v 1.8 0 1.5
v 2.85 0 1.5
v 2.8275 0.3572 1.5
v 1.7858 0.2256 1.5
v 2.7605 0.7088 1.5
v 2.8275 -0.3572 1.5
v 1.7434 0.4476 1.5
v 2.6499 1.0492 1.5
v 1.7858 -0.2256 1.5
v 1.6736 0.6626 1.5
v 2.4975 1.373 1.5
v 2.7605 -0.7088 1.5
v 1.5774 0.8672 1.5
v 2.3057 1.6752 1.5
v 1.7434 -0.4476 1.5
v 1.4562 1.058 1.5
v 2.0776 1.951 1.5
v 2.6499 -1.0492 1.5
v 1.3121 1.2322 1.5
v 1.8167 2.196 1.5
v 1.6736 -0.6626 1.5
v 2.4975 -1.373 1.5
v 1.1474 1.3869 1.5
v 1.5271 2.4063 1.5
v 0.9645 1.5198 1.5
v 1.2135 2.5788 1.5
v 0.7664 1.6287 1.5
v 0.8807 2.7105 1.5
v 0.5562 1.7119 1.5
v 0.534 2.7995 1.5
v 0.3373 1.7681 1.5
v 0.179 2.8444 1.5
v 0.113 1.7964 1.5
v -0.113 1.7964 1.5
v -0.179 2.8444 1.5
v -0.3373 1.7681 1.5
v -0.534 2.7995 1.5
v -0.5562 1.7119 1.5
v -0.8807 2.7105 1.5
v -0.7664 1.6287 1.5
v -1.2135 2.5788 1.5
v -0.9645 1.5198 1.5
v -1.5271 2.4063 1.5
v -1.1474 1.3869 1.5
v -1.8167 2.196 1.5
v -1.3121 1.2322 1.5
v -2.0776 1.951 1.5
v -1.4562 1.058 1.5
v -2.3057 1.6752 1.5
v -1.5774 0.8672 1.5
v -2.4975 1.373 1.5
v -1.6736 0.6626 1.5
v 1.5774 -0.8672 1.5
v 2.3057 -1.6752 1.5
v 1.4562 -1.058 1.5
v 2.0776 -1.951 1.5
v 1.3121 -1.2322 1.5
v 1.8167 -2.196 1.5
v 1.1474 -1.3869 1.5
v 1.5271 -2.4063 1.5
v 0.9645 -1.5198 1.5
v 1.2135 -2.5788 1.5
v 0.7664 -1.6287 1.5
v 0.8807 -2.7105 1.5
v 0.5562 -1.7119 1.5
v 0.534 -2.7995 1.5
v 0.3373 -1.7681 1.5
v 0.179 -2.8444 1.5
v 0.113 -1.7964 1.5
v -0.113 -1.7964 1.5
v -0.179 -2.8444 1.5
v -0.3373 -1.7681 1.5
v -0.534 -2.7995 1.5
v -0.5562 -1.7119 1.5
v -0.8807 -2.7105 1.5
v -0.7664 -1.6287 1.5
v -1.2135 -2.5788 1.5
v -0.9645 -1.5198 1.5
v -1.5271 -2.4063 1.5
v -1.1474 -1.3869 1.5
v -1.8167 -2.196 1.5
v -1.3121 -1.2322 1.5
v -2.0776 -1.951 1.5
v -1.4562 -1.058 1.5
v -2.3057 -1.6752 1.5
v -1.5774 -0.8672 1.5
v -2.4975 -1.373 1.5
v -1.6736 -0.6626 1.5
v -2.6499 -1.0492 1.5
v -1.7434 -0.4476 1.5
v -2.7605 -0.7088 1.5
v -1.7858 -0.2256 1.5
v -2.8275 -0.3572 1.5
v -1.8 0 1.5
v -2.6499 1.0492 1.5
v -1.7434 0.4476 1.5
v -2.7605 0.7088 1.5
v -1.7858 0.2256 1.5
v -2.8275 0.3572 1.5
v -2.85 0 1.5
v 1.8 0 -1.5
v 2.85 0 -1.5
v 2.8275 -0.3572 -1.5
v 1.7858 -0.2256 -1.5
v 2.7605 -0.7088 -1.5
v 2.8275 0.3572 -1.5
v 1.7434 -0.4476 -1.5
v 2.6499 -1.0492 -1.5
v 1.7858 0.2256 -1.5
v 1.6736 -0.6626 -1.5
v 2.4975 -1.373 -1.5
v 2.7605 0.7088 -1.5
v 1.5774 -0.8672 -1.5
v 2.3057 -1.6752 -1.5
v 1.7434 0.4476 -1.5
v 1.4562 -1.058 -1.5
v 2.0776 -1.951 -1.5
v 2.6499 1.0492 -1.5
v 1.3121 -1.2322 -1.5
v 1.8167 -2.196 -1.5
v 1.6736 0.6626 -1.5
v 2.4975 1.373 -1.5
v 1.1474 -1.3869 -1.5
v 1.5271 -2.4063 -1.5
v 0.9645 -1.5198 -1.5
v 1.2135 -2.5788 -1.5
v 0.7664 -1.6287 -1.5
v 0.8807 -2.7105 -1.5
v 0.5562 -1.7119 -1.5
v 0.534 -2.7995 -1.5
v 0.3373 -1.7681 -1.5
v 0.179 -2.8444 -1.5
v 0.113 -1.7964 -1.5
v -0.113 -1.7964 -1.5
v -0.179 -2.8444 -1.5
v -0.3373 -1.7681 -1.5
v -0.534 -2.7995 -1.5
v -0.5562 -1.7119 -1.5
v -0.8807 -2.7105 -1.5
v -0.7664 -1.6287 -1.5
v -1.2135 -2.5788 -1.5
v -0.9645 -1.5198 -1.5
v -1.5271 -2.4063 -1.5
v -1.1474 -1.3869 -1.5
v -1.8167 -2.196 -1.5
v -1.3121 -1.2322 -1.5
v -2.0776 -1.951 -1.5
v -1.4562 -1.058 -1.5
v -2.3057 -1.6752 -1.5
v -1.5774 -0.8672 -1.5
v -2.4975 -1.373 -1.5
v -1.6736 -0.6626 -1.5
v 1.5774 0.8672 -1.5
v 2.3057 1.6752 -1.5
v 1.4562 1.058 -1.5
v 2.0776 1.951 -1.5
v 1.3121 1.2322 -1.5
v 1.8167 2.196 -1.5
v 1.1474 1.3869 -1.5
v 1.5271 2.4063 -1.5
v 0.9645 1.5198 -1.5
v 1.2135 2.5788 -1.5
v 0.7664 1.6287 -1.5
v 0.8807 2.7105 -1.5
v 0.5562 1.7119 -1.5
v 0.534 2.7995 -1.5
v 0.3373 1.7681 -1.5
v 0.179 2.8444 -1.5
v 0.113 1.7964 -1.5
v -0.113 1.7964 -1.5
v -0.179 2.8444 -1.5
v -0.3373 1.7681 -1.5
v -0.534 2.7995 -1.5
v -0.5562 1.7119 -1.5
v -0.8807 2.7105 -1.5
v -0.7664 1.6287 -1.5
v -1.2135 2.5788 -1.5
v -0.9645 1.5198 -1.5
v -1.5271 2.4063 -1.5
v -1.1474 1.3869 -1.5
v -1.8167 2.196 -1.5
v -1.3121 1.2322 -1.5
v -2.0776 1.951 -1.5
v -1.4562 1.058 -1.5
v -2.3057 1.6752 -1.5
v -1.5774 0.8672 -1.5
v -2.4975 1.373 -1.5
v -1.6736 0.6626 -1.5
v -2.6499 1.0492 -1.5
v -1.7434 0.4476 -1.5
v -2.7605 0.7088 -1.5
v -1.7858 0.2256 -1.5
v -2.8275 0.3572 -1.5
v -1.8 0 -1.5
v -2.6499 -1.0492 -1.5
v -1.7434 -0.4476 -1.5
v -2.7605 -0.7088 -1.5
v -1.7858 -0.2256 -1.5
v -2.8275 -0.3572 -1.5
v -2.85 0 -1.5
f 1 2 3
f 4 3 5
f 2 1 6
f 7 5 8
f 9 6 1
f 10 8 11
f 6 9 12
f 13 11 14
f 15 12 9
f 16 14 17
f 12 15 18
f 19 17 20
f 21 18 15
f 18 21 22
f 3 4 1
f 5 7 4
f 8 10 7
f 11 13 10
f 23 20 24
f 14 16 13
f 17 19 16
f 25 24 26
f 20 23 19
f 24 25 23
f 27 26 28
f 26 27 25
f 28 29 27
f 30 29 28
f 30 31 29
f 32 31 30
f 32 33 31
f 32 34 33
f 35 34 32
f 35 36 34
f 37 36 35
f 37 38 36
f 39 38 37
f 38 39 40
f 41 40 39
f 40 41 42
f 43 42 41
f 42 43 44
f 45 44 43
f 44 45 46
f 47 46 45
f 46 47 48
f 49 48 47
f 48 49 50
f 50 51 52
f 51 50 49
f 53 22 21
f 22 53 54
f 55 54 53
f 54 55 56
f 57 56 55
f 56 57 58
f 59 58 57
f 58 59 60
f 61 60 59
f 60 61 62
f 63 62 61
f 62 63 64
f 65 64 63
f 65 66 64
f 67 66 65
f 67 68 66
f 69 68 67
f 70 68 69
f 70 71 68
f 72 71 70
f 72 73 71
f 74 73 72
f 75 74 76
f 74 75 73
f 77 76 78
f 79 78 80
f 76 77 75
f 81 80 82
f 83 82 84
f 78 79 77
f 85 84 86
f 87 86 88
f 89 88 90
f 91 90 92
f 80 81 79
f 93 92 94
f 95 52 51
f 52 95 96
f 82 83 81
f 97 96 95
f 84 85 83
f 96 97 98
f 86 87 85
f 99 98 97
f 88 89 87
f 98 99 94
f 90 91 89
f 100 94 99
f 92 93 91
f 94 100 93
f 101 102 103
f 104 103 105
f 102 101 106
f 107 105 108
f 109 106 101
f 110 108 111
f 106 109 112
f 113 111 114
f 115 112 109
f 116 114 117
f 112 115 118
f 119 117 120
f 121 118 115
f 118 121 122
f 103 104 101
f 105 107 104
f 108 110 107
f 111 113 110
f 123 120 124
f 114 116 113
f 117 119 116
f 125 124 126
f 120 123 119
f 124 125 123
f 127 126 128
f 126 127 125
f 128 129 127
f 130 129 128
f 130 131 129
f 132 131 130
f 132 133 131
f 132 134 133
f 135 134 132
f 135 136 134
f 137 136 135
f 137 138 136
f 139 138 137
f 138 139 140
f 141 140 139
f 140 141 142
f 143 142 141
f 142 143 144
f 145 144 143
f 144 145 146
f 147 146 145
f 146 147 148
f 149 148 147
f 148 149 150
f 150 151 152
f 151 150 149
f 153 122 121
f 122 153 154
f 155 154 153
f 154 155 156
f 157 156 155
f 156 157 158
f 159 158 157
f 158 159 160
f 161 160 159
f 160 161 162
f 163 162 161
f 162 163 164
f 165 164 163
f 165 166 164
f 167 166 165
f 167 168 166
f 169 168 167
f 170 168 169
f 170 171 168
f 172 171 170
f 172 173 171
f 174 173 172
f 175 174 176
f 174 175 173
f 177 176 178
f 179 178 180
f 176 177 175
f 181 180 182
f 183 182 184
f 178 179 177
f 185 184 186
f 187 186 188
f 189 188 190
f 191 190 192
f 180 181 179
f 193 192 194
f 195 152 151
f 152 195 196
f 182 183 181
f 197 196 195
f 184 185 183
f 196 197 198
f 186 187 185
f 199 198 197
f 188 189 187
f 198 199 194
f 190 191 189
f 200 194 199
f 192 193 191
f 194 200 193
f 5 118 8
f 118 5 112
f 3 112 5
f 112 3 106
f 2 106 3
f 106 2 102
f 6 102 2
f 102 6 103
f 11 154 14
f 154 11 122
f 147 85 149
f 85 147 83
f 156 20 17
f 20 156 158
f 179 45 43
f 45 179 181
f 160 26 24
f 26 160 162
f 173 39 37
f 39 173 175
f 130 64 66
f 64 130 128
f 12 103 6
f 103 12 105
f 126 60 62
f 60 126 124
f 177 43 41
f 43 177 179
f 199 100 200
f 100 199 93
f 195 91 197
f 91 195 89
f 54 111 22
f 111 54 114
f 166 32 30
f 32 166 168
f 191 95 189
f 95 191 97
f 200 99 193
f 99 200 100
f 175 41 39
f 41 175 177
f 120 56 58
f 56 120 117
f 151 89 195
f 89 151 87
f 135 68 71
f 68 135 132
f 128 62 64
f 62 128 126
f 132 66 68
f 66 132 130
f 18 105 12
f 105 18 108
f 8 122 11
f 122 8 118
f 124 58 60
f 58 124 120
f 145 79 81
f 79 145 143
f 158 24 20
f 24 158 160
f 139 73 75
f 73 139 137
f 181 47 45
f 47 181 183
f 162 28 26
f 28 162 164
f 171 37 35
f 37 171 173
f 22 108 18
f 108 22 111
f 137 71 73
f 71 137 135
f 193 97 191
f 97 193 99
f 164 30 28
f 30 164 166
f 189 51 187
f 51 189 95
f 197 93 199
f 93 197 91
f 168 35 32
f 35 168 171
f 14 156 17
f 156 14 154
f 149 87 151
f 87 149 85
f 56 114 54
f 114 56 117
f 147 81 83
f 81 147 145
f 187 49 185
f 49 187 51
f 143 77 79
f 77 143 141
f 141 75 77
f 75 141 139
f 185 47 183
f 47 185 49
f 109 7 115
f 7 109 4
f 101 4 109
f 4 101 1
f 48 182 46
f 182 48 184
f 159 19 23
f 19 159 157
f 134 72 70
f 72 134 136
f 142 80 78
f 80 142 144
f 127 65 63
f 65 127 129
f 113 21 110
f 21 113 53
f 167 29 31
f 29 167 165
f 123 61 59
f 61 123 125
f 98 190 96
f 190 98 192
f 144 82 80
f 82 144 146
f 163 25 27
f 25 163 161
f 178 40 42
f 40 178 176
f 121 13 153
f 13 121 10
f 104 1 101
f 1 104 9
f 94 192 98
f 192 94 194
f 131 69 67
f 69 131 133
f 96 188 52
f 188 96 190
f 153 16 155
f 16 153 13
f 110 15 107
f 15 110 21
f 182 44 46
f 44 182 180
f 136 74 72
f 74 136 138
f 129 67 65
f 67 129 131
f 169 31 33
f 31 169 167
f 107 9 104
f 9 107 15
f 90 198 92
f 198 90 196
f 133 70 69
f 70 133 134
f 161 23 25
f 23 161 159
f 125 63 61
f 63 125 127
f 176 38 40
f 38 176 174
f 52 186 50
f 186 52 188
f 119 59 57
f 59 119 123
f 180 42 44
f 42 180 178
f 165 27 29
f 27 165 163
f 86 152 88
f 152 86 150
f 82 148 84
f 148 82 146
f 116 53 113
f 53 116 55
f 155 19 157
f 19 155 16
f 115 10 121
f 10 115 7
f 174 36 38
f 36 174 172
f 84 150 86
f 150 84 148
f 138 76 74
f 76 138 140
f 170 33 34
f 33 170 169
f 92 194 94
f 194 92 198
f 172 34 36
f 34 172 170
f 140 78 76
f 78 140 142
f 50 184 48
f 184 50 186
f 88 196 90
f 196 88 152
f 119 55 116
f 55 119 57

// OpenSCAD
$fn = 50;


difference() {
	union() {
		translate(v = [0, 0, -1.5000000000]) {
			cylinder(h = 3, r = 1.0000000000);
		}
		translate(v = [0, 0, -1.5000000000]) {
			cylinder(h = 3, r = 2.8500000000);
		}
	}
	union() {
		translate(v = [0, 0, -100.0000000000]) {
			cylinder(h = 200, r = 1.8000000000);
		}
	}
}
